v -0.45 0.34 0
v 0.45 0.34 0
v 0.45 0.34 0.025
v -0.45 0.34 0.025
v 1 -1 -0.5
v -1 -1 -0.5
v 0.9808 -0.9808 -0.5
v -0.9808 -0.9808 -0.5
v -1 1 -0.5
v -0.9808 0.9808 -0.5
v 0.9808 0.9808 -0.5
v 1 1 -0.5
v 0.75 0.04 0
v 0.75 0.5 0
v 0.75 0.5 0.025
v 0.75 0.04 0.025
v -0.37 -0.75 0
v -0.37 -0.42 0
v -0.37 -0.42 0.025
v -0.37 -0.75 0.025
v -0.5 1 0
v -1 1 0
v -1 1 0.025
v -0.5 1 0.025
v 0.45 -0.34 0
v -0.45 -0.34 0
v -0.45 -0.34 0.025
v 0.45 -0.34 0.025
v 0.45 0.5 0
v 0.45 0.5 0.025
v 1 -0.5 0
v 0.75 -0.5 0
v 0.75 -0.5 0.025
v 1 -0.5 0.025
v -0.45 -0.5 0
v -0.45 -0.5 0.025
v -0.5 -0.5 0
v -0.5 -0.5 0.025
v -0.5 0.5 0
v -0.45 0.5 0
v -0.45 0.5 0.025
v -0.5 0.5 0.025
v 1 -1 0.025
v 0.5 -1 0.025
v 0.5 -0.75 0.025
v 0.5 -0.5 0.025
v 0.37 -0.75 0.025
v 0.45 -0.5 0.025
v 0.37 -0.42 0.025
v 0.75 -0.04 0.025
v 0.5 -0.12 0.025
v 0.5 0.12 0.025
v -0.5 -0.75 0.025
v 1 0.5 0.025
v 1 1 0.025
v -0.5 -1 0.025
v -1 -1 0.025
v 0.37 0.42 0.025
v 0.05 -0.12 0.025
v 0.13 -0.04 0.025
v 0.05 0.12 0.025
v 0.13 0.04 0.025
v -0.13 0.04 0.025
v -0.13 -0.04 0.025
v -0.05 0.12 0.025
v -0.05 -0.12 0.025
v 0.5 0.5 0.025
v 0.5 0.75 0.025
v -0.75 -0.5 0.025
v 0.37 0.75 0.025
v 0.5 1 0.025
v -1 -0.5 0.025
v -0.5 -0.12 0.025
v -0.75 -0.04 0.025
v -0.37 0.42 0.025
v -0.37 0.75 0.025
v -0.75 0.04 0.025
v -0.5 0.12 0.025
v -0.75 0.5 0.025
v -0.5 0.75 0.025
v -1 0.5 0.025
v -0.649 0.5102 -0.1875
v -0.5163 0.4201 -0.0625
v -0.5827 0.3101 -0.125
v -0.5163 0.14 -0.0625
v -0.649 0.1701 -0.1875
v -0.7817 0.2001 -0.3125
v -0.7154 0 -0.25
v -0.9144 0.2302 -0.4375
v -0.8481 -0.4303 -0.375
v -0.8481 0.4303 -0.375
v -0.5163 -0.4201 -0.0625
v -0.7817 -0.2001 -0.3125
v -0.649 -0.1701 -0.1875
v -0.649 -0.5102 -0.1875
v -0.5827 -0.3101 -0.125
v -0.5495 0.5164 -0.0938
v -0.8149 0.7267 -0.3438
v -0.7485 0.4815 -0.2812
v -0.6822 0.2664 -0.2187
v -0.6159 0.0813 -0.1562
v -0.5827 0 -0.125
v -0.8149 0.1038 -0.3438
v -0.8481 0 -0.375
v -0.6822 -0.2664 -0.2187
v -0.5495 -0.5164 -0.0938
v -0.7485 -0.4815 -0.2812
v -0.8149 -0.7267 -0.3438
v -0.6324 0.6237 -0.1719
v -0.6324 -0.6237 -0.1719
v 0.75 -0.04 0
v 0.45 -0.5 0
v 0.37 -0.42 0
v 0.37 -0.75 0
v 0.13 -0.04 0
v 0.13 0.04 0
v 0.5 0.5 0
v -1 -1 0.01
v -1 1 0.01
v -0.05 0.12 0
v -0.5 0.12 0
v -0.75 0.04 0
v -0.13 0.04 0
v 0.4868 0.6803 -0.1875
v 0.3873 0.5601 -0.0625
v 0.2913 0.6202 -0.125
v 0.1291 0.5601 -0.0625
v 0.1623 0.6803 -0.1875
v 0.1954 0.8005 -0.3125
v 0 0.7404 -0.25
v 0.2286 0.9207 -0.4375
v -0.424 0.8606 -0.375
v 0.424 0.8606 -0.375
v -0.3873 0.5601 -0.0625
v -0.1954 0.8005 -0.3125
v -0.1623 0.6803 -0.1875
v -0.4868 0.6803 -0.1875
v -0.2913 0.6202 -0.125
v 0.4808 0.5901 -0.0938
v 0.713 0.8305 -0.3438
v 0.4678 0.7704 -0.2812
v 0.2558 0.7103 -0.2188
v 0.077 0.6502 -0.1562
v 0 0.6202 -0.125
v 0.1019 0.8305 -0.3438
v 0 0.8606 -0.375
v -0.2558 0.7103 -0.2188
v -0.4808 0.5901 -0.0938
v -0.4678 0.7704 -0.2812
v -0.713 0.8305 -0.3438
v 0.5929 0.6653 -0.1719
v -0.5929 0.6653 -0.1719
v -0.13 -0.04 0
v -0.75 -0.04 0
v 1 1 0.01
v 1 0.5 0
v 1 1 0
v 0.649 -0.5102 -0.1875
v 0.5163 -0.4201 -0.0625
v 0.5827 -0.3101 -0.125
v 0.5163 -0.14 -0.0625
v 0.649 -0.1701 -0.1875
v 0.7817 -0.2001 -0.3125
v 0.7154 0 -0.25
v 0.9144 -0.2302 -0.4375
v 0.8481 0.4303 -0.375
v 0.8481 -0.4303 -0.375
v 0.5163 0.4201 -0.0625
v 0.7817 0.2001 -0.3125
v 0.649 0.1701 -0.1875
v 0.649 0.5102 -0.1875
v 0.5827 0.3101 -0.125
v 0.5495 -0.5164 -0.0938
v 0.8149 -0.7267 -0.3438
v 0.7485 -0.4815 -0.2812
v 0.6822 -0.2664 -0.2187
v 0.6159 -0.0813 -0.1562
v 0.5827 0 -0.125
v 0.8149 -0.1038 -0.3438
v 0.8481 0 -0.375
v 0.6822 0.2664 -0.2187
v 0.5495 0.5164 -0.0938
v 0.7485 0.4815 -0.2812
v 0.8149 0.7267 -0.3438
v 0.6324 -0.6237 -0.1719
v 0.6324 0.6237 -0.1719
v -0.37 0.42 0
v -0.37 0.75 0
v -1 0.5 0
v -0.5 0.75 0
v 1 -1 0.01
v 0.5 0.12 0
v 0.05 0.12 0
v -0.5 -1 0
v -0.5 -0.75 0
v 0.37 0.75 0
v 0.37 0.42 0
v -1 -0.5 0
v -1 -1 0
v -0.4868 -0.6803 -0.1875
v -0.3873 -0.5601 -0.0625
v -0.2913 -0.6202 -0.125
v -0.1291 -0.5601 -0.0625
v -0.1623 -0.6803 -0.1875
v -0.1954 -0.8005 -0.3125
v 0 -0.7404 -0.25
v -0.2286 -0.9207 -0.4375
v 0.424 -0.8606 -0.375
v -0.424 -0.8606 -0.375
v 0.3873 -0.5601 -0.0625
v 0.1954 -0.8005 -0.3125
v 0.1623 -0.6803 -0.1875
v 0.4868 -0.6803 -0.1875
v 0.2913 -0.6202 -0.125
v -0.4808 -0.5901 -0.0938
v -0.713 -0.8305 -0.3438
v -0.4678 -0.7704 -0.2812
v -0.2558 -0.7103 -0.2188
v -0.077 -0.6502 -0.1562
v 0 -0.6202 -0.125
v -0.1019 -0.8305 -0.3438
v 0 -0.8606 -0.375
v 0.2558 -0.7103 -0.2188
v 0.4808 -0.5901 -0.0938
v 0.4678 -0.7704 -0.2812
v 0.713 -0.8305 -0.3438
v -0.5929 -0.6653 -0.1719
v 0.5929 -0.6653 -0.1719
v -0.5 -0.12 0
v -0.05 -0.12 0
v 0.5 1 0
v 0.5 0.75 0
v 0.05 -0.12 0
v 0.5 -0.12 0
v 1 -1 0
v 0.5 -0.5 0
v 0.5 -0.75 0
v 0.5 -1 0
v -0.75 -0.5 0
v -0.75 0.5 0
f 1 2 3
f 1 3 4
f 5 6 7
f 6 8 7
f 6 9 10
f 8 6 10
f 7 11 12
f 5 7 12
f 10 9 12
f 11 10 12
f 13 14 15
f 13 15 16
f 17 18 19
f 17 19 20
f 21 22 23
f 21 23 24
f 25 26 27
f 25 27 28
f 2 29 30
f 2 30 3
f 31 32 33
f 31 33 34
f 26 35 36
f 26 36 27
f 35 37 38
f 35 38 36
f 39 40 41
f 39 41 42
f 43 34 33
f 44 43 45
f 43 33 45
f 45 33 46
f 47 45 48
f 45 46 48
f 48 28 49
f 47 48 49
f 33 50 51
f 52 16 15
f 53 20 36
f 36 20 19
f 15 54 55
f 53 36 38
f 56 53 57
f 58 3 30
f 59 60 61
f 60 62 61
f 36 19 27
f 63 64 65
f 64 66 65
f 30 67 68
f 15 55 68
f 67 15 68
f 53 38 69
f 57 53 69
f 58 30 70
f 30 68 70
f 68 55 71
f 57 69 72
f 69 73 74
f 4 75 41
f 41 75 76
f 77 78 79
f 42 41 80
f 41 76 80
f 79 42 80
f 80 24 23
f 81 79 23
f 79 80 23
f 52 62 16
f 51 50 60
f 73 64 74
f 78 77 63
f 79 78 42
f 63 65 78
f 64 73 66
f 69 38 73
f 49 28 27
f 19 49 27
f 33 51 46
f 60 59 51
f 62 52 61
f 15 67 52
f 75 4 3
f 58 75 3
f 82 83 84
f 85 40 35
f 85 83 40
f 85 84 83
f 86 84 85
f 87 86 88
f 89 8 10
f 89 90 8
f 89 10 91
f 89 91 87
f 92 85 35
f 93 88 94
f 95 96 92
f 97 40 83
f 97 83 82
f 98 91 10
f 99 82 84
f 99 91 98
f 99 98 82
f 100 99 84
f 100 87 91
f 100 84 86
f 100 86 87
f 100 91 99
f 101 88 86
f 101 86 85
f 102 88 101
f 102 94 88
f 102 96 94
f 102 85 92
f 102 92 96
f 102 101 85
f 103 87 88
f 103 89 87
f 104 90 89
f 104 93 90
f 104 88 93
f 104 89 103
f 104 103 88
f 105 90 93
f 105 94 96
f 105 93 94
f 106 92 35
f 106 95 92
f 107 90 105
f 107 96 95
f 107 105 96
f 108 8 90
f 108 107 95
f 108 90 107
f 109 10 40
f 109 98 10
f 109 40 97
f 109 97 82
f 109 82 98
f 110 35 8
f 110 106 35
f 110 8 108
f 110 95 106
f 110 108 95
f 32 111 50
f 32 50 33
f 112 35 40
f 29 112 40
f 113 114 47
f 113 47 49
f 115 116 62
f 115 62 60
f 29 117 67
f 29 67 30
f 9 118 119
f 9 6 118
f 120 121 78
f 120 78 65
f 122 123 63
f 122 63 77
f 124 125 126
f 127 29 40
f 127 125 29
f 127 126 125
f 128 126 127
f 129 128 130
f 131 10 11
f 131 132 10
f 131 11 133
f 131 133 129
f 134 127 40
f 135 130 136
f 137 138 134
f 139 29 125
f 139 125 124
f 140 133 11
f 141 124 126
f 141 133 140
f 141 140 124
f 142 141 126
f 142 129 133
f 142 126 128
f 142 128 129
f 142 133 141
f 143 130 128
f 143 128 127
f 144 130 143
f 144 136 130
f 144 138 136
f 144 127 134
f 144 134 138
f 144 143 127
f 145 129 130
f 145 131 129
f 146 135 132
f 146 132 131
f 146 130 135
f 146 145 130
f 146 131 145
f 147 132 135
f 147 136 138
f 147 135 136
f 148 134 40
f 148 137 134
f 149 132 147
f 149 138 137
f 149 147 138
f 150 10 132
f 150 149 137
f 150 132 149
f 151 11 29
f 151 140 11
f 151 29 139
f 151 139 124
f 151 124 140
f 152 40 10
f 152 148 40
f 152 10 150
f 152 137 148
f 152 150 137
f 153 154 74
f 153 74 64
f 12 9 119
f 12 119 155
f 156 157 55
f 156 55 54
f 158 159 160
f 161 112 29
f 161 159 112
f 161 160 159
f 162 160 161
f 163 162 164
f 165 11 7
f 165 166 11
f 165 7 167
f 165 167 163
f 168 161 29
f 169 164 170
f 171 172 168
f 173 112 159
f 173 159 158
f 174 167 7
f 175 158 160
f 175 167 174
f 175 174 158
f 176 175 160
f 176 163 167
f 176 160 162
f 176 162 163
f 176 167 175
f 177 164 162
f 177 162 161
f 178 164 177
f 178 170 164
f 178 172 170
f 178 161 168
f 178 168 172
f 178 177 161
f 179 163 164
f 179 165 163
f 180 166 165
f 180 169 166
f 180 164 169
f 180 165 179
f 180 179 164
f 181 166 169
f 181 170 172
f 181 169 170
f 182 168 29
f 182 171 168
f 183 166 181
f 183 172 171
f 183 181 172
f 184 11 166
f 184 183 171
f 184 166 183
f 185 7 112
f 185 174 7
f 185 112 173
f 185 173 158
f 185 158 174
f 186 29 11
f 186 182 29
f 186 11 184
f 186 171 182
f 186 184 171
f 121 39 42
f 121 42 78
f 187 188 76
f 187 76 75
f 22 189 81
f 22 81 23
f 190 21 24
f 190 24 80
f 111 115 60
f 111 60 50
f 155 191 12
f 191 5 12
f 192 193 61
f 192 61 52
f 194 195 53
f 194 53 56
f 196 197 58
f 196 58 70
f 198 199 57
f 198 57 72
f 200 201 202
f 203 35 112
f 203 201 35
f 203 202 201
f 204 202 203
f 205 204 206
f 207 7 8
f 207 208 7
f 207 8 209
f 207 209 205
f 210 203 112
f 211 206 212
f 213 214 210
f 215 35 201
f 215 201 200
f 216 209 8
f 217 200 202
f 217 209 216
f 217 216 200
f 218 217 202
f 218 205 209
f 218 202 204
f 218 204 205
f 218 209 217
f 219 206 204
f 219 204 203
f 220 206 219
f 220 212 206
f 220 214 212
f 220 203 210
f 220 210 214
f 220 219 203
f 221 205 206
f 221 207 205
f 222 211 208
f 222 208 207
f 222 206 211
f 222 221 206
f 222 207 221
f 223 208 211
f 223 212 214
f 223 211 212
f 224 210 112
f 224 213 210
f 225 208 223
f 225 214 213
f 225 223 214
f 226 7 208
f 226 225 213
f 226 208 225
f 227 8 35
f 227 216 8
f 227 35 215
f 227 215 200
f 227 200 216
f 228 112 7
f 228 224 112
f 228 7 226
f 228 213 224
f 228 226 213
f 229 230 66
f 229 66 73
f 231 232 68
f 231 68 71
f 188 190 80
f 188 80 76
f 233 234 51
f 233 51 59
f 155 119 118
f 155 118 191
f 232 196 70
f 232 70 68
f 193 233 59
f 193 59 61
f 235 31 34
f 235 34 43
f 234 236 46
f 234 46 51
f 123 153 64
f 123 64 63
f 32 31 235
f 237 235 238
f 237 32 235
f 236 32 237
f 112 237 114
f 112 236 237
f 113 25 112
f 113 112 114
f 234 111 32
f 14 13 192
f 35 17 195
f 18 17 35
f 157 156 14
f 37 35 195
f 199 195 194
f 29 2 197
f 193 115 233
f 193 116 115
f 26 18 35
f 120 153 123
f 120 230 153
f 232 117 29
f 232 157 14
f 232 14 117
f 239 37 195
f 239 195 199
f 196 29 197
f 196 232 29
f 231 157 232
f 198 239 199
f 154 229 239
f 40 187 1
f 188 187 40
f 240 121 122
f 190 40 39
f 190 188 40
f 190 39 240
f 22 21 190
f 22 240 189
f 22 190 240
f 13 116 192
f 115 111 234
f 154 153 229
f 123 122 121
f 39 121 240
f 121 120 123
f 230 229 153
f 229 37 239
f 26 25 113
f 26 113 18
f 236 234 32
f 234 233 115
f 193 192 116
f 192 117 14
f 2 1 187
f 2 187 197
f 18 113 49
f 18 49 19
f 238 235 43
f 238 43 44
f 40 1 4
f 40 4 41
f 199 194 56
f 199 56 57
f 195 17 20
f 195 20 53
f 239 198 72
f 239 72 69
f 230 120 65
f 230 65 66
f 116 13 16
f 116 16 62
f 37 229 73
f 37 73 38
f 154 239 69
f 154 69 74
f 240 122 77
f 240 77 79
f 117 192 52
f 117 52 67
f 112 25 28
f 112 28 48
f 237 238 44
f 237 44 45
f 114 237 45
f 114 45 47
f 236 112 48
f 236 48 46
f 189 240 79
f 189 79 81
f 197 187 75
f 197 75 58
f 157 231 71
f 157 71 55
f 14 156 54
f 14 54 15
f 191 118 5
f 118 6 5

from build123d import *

# Parameters (mm, degrees)
WAFER_W             = 2
WAFER_H             = 2
BOSS_EXTRUDE3_DEPTH = 0.5
SIN_LAYER_W         = 2
SIN_LAYER_H         = 2
BOSS_EXTRUDE4_DEPTH = 0.01
BOSS_EXTRUDE5_DEPTH = 0.025
TOP_MEMBRANE_W      = 0.9
TOP_MEMBRANE_H      = 1
BOTTOM_W            = 1.96151
BOTTOM_H            = 1.96151


with BuildPart() as part:
    # wafer → Boss-Extrude3 (new body)
    with BuildSketch(Plane.XY):
        Rectangle(WAFER_W, WAFER_H)
    extrude(amount=-BOSS_EXTRUDE3_DEPTH)

    # SiN Layer → Boss-Extrude4 (add)
    with BuildSketch(Plane.XY):
        Rectangle(SIN_LAYER_W, SIN_LAYER_H)
    extrude(amount=BOSS_EXTRUDE4_DEPTH)

    # top membrane → Cut-Loft8 section 0
    with BuildSketch(Plane.XY):
        Rectangle(TOP_MEMBRANE_W, TOP_MEMBRANE_H)
    # bottom → Cut-Loft8 section 1
    with BuildSketch(Plane.XY.offset(-0.5)):
        Rectangle(BOTTOM_W, BOTTOM_H)
    loft(mode=Mode.SUBTRACT)


with BuildPart() as body_2:
    # circuit → Boss-Extrude5 (new body)
    with BuildSketch(Plane.XY):
        Polygon((-1, 1), (-0.5, 1), (-0.5, 0.75), (-0.37, 0.75), (-0.37, 0.42), (0.37, 0.42), (0.37, 0.75), (0.5, 0.75), (0.5, 1), (1, 1), (1, 0.5), (0.75, 0.5), (0.75, 0.04), (0.13, 0.04), (0.13, -0.04), (0.75, -0.04), (0.75, -0.5), (1, -0.5), (1, -1), (0.5, -1), (0.5, -0.75), (0.37, -0.75), (0.37, -0.42), (-0.37, -0.42), (-0.37, -0.75), (-0.5, -0.75), (-0.5, -1), (-1, -1), (-1, -0.5), (-0.75, -0.5), (-0.75, -0.04), (-0.13, -0.04), (-0.13, 0.04), (-0.75, 0.04), (-0.75, 0.5), (-1, 0.5), align=None)
        Polygon((-0.45, 0.5), (-0.5, 0.5), (-0.5, 0.12), (-0.05, 0.12), (-0.05, -0.12), (-0.5, -0.12), (-0.5, -0.5), (-0.45, -0.5), (-0.45, -0.34), (0.45, -0.34), (0.45, -0.5), (0.5, -0.5), (0.5, -0.12), (0.05, -0.12), (0.05, 0.12), (0.5, 0.12), (0.5, 0.5), (0.45, 0.5), (0.45, 0.34), (-0.45, 0.34), align=None, mode=Mode.SUBTRACT)
    extrude(amount=BOSS_EXTRUDE5_DEPTH)


solid = Compound([part.part, body_2.part])
